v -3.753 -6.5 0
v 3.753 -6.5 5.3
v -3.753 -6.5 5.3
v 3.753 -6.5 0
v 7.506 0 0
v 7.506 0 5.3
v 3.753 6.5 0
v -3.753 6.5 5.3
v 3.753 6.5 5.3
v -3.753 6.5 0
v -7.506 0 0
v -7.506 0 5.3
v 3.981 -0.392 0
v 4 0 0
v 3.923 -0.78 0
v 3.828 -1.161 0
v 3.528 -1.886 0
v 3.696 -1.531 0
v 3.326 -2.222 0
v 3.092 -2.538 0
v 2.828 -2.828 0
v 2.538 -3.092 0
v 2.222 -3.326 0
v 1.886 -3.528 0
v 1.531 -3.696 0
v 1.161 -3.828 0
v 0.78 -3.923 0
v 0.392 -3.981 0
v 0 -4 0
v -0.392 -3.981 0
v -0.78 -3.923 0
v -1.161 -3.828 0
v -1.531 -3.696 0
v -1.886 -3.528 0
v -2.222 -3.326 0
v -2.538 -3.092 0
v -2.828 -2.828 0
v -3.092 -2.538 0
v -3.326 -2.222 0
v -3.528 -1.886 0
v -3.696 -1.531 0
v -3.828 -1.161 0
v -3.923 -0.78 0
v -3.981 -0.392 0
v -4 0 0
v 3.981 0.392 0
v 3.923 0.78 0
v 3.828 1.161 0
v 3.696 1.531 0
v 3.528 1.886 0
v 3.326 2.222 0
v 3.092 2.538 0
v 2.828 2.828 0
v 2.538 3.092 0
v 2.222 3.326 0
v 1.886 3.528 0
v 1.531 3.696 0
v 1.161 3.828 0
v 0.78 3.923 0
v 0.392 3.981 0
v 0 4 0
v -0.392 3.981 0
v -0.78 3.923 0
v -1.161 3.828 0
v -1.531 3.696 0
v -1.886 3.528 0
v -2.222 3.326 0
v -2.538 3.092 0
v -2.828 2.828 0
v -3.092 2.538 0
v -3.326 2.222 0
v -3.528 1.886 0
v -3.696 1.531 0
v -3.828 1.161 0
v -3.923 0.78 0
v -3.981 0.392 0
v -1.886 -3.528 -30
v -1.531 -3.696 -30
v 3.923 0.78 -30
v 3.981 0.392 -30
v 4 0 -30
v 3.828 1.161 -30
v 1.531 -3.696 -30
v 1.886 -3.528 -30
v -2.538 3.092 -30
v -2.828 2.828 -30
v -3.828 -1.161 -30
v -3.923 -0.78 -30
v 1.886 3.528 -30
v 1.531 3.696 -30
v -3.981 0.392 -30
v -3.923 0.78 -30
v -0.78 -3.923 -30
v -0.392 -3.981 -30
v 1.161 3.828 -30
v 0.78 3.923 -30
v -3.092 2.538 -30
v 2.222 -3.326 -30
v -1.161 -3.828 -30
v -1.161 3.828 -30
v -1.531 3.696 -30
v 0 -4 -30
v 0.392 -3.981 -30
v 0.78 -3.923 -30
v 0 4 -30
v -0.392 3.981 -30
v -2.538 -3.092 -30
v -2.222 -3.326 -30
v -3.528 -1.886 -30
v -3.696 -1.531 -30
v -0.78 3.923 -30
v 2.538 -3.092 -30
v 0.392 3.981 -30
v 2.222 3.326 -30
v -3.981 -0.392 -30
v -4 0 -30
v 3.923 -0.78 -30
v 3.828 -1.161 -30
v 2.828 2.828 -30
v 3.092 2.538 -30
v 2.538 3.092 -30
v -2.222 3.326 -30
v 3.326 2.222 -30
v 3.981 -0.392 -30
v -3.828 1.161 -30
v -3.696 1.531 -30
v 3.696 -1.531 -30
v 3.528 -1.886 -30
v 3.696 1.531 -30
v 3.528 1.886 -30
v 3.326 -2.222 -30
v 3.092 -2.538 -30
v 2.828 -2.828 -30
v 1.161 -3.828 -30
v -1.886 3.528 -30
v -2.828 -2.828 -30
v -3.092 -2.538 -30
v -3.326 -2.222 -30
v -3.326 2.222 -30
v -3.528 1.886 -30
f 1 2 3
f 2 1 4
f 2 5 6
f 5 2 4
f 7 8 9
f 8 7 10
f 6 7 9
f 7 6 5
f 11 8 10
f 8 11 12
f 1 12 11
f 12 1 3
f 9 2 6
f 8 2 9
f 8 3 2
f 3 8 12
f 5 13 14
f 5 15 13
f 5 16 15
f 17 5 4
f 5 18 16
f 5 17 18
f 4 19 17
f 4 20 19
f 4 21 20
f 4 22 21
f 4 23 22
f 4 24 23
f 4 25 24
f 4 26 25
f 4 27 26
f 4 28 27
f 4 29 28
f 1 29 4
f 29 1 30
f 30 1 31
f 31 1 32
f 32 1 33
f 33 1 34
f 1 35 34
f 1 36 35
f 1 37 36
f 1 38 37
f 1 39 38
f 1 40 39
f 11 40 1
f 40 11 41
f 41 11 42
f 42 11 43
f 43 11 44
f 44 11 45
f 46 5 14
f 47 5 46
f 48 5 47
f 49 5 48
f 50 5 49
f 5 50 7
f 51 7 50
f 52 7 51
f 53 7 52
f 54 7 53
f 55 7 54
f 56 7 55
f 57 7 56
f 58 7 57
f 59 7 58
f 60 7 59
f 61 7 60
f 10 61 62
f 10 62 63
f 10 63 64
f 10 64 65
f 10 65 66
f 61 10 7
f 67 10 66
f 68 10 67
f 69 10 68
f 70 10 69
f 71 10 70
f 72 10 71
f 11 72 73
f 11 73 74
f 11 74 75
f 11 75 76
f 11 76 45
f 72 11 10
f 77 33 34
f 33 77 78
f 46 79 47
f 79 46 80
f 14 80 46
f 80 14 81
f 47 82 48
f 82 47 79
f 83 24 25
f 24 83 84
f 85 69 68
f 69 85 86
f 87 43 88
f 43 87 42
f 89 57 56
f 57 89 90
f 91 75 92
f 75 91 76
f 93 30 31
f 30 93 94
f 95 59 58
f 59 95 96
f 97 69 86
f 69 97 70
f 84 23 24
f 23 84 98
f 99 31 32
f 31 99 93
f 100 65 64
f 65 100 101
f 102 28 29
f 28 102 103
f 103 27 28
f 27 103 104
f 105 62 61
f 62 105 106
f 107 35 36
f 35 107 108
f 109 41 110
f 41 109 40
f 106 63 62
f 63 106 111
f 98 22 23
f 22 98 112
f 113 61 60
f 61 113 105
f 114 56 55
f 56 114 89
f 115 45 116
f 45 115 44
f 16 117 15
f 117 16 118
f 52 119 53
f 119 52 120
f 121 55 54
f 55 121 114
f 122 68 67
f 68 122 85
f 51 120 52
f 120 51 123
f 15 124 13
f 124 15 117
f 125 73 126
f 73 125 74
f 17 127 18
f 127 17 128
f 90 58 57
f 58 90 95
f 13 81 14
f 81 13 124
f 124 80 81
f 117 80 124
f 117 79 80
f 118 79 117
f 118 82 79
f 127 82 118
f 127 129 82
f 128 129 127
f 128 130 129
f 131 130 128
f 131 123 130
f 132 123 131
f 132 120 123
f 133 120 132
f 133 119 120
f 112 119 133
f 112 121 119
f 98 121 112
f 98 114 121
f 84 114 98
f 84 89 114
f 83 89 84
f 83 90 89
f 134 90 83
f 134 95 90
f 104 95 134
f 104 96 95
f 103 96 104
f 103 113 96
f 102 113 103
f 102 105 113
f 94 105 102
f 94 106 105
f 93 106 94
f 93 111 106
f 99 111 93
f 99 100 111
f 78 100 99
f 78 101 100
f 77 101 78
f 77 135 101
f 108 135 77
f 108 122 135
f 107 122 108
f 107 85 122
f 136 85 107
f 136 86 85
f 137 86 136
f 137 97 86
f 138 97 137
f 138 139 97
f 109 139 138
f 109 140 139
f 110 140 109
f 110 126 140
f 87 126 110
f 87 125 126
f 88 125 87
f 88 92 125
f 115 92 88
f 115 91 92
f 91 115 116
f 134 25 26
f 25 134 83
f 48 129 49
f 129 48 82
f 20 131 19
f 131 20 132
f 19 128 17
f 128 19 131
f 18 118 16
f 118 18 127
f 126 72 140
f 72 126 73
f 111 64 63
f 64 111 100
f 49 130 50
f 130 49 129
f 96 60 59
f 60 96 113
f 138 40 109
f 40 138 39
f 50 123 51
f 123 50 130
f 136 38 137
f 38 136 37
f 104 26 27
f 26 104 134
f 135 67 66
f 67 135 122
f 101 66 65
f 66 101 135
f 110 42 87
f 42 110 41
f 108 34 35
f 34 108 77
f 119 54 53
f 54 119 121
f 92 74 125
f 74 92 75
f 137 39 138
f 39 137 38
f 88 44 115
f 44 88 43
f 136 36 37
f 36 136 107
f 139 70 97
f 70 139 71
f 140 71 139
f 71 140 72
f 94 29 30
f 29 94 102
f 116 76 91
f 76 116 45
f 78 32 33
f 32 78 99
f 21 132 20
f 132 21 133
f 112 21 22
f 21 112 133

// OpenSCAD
$fn = 64;

af = 13;          // 対辺距離
head_h = 5.3;     // 頭部高さ
shank_d = 8;      // シャンク直径
shank_l = 30;     // シャンク長さ

// 頭部(六角柱): 対辺距離から外接円半径に換算
cylinder(h = head_h, r = af / 2 / cos(30), $fn = 6);

// シャンク: z<0 側へ
translate([0, 0, -shank_l])
    cylinder(h = shank_l, d = shank_d);
